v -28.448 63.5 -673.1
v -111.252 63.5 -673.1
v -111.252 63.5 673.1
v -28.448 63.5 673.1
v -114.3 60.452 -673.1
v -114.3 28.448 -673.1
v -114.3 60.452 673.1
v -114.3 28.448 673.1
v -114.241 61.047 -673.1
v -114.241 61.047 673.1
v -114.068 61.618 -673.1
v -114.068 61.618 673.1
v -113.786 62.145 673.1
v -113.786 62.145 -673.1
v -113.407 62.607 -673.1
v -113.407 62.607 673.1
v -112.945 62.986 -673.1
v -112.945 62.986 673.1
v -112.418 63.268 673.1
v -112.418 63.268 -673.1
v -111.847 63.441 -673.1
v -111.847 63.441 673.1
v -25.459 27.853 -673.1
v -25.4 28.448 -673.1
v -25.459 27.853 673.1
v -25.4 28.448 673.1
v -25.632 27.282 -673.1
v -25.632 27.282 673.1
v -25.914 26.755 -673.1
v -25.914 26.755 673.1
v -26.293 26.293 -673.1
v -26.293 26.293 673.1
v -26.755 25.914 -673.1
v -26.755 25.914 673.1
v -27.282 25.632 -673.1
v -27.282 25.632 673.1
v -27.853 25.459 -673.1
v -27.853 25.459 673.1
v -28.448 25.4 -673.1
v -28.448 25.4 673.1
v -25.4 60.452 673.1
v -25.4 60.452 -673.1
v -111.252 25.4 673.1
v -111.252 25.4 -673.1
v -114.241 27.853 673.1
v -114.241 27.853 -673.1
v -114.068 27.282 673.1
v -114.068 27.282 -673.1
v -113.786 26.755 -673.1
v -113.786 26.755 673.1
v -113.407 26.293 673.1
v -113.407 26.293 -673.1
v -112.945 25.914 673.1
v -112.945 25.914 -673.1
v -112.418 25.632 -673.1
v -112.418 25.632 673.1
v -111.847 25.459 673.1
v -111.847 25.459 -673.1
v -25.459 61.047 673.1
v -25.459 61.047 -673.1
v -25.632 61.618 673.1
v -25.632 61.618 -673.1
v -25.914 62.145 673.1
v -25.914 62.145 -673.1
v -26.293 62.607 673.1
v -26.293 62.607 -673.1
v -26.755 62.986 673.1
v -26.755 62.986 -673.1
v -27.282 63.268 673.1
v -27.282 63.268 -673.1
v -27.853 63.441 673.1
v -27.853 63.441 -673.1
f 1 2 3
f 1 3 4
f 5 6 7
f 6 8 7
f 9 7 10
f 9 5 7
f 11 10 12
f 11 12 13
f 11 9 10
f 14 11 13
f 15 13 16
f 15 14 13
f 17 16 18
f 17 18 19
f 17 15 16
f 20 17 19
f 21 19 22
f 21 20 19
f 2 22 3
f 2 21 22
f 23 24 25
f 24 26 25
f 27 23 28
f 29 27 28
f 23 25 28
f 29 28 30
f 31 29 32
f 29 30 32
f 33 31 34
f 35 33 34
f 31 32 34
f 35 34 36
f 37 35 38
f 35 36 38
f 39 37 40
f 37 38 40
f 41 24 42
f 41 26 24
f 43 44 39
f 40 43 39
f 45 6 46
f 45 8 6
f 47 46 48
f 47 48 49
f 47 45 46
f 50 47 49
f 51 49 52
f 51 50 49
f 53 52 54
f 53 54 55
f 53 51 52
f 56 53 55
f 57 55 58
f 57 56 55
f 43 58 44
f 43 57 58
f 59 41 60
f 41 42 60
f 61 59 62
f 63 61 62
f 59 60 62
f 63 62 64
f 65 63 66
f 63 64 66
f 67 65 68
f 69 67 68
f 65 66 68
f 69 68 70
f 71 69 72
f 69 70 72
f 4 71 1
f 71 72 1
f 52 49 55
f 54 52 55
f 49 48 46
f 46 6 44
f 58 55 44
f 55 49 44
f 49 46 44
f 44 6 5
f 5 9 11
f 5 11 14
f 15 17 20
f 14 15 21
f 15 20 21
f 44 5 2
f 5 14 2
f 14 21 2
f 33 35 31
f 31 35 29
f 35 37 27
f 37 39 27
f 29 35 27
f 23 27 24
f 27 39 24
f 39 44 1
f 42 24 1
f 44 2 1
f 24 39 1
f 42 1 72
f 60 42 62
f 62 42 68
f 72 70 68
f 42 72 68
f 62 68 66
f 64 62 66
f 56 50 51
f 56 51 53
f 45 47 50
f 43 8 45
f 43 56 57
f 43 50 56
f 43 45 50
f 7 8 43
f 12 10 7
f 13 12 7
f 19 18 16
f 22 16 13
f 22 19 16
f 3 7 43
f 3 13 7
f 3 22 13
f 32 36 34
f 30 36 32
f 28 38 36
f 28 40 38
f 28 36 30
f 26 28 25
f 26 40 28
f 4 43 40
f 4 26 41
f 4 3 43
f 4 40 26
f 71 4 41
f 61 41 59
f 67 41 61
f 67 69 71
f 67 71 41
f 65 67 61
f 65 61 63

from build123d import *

# Parameters (mm, degrees)
SKETCH_W  = 88.9
SKETCH_H  = 38.1
PAD_DEPTH = 673.1
FILLET_R  = 3.048


with BuildPart() as part:
    # Sketch → Pad (new body, symmetric)
    with BuildSketch(Plane.XY):
        with Locations((-69.85, 44.45)):
            Rectangle(SKETCH_W, SKETCH_H)
    extrude(amount=PAD_DEPTH, both=True)

    # Fillet
    fillet_edges = [part.edges().sort_by_distance(p)[0] for p in [
        (-25.4, 63.5, 0),
        (-114.3, 63.5, 0),
        (-25.4, 25.4, 0),
        (-114.3, 25.4, 0),
    ]]
    fillet(fillet_edges, radius=FILLET_R)


solid = part.part
